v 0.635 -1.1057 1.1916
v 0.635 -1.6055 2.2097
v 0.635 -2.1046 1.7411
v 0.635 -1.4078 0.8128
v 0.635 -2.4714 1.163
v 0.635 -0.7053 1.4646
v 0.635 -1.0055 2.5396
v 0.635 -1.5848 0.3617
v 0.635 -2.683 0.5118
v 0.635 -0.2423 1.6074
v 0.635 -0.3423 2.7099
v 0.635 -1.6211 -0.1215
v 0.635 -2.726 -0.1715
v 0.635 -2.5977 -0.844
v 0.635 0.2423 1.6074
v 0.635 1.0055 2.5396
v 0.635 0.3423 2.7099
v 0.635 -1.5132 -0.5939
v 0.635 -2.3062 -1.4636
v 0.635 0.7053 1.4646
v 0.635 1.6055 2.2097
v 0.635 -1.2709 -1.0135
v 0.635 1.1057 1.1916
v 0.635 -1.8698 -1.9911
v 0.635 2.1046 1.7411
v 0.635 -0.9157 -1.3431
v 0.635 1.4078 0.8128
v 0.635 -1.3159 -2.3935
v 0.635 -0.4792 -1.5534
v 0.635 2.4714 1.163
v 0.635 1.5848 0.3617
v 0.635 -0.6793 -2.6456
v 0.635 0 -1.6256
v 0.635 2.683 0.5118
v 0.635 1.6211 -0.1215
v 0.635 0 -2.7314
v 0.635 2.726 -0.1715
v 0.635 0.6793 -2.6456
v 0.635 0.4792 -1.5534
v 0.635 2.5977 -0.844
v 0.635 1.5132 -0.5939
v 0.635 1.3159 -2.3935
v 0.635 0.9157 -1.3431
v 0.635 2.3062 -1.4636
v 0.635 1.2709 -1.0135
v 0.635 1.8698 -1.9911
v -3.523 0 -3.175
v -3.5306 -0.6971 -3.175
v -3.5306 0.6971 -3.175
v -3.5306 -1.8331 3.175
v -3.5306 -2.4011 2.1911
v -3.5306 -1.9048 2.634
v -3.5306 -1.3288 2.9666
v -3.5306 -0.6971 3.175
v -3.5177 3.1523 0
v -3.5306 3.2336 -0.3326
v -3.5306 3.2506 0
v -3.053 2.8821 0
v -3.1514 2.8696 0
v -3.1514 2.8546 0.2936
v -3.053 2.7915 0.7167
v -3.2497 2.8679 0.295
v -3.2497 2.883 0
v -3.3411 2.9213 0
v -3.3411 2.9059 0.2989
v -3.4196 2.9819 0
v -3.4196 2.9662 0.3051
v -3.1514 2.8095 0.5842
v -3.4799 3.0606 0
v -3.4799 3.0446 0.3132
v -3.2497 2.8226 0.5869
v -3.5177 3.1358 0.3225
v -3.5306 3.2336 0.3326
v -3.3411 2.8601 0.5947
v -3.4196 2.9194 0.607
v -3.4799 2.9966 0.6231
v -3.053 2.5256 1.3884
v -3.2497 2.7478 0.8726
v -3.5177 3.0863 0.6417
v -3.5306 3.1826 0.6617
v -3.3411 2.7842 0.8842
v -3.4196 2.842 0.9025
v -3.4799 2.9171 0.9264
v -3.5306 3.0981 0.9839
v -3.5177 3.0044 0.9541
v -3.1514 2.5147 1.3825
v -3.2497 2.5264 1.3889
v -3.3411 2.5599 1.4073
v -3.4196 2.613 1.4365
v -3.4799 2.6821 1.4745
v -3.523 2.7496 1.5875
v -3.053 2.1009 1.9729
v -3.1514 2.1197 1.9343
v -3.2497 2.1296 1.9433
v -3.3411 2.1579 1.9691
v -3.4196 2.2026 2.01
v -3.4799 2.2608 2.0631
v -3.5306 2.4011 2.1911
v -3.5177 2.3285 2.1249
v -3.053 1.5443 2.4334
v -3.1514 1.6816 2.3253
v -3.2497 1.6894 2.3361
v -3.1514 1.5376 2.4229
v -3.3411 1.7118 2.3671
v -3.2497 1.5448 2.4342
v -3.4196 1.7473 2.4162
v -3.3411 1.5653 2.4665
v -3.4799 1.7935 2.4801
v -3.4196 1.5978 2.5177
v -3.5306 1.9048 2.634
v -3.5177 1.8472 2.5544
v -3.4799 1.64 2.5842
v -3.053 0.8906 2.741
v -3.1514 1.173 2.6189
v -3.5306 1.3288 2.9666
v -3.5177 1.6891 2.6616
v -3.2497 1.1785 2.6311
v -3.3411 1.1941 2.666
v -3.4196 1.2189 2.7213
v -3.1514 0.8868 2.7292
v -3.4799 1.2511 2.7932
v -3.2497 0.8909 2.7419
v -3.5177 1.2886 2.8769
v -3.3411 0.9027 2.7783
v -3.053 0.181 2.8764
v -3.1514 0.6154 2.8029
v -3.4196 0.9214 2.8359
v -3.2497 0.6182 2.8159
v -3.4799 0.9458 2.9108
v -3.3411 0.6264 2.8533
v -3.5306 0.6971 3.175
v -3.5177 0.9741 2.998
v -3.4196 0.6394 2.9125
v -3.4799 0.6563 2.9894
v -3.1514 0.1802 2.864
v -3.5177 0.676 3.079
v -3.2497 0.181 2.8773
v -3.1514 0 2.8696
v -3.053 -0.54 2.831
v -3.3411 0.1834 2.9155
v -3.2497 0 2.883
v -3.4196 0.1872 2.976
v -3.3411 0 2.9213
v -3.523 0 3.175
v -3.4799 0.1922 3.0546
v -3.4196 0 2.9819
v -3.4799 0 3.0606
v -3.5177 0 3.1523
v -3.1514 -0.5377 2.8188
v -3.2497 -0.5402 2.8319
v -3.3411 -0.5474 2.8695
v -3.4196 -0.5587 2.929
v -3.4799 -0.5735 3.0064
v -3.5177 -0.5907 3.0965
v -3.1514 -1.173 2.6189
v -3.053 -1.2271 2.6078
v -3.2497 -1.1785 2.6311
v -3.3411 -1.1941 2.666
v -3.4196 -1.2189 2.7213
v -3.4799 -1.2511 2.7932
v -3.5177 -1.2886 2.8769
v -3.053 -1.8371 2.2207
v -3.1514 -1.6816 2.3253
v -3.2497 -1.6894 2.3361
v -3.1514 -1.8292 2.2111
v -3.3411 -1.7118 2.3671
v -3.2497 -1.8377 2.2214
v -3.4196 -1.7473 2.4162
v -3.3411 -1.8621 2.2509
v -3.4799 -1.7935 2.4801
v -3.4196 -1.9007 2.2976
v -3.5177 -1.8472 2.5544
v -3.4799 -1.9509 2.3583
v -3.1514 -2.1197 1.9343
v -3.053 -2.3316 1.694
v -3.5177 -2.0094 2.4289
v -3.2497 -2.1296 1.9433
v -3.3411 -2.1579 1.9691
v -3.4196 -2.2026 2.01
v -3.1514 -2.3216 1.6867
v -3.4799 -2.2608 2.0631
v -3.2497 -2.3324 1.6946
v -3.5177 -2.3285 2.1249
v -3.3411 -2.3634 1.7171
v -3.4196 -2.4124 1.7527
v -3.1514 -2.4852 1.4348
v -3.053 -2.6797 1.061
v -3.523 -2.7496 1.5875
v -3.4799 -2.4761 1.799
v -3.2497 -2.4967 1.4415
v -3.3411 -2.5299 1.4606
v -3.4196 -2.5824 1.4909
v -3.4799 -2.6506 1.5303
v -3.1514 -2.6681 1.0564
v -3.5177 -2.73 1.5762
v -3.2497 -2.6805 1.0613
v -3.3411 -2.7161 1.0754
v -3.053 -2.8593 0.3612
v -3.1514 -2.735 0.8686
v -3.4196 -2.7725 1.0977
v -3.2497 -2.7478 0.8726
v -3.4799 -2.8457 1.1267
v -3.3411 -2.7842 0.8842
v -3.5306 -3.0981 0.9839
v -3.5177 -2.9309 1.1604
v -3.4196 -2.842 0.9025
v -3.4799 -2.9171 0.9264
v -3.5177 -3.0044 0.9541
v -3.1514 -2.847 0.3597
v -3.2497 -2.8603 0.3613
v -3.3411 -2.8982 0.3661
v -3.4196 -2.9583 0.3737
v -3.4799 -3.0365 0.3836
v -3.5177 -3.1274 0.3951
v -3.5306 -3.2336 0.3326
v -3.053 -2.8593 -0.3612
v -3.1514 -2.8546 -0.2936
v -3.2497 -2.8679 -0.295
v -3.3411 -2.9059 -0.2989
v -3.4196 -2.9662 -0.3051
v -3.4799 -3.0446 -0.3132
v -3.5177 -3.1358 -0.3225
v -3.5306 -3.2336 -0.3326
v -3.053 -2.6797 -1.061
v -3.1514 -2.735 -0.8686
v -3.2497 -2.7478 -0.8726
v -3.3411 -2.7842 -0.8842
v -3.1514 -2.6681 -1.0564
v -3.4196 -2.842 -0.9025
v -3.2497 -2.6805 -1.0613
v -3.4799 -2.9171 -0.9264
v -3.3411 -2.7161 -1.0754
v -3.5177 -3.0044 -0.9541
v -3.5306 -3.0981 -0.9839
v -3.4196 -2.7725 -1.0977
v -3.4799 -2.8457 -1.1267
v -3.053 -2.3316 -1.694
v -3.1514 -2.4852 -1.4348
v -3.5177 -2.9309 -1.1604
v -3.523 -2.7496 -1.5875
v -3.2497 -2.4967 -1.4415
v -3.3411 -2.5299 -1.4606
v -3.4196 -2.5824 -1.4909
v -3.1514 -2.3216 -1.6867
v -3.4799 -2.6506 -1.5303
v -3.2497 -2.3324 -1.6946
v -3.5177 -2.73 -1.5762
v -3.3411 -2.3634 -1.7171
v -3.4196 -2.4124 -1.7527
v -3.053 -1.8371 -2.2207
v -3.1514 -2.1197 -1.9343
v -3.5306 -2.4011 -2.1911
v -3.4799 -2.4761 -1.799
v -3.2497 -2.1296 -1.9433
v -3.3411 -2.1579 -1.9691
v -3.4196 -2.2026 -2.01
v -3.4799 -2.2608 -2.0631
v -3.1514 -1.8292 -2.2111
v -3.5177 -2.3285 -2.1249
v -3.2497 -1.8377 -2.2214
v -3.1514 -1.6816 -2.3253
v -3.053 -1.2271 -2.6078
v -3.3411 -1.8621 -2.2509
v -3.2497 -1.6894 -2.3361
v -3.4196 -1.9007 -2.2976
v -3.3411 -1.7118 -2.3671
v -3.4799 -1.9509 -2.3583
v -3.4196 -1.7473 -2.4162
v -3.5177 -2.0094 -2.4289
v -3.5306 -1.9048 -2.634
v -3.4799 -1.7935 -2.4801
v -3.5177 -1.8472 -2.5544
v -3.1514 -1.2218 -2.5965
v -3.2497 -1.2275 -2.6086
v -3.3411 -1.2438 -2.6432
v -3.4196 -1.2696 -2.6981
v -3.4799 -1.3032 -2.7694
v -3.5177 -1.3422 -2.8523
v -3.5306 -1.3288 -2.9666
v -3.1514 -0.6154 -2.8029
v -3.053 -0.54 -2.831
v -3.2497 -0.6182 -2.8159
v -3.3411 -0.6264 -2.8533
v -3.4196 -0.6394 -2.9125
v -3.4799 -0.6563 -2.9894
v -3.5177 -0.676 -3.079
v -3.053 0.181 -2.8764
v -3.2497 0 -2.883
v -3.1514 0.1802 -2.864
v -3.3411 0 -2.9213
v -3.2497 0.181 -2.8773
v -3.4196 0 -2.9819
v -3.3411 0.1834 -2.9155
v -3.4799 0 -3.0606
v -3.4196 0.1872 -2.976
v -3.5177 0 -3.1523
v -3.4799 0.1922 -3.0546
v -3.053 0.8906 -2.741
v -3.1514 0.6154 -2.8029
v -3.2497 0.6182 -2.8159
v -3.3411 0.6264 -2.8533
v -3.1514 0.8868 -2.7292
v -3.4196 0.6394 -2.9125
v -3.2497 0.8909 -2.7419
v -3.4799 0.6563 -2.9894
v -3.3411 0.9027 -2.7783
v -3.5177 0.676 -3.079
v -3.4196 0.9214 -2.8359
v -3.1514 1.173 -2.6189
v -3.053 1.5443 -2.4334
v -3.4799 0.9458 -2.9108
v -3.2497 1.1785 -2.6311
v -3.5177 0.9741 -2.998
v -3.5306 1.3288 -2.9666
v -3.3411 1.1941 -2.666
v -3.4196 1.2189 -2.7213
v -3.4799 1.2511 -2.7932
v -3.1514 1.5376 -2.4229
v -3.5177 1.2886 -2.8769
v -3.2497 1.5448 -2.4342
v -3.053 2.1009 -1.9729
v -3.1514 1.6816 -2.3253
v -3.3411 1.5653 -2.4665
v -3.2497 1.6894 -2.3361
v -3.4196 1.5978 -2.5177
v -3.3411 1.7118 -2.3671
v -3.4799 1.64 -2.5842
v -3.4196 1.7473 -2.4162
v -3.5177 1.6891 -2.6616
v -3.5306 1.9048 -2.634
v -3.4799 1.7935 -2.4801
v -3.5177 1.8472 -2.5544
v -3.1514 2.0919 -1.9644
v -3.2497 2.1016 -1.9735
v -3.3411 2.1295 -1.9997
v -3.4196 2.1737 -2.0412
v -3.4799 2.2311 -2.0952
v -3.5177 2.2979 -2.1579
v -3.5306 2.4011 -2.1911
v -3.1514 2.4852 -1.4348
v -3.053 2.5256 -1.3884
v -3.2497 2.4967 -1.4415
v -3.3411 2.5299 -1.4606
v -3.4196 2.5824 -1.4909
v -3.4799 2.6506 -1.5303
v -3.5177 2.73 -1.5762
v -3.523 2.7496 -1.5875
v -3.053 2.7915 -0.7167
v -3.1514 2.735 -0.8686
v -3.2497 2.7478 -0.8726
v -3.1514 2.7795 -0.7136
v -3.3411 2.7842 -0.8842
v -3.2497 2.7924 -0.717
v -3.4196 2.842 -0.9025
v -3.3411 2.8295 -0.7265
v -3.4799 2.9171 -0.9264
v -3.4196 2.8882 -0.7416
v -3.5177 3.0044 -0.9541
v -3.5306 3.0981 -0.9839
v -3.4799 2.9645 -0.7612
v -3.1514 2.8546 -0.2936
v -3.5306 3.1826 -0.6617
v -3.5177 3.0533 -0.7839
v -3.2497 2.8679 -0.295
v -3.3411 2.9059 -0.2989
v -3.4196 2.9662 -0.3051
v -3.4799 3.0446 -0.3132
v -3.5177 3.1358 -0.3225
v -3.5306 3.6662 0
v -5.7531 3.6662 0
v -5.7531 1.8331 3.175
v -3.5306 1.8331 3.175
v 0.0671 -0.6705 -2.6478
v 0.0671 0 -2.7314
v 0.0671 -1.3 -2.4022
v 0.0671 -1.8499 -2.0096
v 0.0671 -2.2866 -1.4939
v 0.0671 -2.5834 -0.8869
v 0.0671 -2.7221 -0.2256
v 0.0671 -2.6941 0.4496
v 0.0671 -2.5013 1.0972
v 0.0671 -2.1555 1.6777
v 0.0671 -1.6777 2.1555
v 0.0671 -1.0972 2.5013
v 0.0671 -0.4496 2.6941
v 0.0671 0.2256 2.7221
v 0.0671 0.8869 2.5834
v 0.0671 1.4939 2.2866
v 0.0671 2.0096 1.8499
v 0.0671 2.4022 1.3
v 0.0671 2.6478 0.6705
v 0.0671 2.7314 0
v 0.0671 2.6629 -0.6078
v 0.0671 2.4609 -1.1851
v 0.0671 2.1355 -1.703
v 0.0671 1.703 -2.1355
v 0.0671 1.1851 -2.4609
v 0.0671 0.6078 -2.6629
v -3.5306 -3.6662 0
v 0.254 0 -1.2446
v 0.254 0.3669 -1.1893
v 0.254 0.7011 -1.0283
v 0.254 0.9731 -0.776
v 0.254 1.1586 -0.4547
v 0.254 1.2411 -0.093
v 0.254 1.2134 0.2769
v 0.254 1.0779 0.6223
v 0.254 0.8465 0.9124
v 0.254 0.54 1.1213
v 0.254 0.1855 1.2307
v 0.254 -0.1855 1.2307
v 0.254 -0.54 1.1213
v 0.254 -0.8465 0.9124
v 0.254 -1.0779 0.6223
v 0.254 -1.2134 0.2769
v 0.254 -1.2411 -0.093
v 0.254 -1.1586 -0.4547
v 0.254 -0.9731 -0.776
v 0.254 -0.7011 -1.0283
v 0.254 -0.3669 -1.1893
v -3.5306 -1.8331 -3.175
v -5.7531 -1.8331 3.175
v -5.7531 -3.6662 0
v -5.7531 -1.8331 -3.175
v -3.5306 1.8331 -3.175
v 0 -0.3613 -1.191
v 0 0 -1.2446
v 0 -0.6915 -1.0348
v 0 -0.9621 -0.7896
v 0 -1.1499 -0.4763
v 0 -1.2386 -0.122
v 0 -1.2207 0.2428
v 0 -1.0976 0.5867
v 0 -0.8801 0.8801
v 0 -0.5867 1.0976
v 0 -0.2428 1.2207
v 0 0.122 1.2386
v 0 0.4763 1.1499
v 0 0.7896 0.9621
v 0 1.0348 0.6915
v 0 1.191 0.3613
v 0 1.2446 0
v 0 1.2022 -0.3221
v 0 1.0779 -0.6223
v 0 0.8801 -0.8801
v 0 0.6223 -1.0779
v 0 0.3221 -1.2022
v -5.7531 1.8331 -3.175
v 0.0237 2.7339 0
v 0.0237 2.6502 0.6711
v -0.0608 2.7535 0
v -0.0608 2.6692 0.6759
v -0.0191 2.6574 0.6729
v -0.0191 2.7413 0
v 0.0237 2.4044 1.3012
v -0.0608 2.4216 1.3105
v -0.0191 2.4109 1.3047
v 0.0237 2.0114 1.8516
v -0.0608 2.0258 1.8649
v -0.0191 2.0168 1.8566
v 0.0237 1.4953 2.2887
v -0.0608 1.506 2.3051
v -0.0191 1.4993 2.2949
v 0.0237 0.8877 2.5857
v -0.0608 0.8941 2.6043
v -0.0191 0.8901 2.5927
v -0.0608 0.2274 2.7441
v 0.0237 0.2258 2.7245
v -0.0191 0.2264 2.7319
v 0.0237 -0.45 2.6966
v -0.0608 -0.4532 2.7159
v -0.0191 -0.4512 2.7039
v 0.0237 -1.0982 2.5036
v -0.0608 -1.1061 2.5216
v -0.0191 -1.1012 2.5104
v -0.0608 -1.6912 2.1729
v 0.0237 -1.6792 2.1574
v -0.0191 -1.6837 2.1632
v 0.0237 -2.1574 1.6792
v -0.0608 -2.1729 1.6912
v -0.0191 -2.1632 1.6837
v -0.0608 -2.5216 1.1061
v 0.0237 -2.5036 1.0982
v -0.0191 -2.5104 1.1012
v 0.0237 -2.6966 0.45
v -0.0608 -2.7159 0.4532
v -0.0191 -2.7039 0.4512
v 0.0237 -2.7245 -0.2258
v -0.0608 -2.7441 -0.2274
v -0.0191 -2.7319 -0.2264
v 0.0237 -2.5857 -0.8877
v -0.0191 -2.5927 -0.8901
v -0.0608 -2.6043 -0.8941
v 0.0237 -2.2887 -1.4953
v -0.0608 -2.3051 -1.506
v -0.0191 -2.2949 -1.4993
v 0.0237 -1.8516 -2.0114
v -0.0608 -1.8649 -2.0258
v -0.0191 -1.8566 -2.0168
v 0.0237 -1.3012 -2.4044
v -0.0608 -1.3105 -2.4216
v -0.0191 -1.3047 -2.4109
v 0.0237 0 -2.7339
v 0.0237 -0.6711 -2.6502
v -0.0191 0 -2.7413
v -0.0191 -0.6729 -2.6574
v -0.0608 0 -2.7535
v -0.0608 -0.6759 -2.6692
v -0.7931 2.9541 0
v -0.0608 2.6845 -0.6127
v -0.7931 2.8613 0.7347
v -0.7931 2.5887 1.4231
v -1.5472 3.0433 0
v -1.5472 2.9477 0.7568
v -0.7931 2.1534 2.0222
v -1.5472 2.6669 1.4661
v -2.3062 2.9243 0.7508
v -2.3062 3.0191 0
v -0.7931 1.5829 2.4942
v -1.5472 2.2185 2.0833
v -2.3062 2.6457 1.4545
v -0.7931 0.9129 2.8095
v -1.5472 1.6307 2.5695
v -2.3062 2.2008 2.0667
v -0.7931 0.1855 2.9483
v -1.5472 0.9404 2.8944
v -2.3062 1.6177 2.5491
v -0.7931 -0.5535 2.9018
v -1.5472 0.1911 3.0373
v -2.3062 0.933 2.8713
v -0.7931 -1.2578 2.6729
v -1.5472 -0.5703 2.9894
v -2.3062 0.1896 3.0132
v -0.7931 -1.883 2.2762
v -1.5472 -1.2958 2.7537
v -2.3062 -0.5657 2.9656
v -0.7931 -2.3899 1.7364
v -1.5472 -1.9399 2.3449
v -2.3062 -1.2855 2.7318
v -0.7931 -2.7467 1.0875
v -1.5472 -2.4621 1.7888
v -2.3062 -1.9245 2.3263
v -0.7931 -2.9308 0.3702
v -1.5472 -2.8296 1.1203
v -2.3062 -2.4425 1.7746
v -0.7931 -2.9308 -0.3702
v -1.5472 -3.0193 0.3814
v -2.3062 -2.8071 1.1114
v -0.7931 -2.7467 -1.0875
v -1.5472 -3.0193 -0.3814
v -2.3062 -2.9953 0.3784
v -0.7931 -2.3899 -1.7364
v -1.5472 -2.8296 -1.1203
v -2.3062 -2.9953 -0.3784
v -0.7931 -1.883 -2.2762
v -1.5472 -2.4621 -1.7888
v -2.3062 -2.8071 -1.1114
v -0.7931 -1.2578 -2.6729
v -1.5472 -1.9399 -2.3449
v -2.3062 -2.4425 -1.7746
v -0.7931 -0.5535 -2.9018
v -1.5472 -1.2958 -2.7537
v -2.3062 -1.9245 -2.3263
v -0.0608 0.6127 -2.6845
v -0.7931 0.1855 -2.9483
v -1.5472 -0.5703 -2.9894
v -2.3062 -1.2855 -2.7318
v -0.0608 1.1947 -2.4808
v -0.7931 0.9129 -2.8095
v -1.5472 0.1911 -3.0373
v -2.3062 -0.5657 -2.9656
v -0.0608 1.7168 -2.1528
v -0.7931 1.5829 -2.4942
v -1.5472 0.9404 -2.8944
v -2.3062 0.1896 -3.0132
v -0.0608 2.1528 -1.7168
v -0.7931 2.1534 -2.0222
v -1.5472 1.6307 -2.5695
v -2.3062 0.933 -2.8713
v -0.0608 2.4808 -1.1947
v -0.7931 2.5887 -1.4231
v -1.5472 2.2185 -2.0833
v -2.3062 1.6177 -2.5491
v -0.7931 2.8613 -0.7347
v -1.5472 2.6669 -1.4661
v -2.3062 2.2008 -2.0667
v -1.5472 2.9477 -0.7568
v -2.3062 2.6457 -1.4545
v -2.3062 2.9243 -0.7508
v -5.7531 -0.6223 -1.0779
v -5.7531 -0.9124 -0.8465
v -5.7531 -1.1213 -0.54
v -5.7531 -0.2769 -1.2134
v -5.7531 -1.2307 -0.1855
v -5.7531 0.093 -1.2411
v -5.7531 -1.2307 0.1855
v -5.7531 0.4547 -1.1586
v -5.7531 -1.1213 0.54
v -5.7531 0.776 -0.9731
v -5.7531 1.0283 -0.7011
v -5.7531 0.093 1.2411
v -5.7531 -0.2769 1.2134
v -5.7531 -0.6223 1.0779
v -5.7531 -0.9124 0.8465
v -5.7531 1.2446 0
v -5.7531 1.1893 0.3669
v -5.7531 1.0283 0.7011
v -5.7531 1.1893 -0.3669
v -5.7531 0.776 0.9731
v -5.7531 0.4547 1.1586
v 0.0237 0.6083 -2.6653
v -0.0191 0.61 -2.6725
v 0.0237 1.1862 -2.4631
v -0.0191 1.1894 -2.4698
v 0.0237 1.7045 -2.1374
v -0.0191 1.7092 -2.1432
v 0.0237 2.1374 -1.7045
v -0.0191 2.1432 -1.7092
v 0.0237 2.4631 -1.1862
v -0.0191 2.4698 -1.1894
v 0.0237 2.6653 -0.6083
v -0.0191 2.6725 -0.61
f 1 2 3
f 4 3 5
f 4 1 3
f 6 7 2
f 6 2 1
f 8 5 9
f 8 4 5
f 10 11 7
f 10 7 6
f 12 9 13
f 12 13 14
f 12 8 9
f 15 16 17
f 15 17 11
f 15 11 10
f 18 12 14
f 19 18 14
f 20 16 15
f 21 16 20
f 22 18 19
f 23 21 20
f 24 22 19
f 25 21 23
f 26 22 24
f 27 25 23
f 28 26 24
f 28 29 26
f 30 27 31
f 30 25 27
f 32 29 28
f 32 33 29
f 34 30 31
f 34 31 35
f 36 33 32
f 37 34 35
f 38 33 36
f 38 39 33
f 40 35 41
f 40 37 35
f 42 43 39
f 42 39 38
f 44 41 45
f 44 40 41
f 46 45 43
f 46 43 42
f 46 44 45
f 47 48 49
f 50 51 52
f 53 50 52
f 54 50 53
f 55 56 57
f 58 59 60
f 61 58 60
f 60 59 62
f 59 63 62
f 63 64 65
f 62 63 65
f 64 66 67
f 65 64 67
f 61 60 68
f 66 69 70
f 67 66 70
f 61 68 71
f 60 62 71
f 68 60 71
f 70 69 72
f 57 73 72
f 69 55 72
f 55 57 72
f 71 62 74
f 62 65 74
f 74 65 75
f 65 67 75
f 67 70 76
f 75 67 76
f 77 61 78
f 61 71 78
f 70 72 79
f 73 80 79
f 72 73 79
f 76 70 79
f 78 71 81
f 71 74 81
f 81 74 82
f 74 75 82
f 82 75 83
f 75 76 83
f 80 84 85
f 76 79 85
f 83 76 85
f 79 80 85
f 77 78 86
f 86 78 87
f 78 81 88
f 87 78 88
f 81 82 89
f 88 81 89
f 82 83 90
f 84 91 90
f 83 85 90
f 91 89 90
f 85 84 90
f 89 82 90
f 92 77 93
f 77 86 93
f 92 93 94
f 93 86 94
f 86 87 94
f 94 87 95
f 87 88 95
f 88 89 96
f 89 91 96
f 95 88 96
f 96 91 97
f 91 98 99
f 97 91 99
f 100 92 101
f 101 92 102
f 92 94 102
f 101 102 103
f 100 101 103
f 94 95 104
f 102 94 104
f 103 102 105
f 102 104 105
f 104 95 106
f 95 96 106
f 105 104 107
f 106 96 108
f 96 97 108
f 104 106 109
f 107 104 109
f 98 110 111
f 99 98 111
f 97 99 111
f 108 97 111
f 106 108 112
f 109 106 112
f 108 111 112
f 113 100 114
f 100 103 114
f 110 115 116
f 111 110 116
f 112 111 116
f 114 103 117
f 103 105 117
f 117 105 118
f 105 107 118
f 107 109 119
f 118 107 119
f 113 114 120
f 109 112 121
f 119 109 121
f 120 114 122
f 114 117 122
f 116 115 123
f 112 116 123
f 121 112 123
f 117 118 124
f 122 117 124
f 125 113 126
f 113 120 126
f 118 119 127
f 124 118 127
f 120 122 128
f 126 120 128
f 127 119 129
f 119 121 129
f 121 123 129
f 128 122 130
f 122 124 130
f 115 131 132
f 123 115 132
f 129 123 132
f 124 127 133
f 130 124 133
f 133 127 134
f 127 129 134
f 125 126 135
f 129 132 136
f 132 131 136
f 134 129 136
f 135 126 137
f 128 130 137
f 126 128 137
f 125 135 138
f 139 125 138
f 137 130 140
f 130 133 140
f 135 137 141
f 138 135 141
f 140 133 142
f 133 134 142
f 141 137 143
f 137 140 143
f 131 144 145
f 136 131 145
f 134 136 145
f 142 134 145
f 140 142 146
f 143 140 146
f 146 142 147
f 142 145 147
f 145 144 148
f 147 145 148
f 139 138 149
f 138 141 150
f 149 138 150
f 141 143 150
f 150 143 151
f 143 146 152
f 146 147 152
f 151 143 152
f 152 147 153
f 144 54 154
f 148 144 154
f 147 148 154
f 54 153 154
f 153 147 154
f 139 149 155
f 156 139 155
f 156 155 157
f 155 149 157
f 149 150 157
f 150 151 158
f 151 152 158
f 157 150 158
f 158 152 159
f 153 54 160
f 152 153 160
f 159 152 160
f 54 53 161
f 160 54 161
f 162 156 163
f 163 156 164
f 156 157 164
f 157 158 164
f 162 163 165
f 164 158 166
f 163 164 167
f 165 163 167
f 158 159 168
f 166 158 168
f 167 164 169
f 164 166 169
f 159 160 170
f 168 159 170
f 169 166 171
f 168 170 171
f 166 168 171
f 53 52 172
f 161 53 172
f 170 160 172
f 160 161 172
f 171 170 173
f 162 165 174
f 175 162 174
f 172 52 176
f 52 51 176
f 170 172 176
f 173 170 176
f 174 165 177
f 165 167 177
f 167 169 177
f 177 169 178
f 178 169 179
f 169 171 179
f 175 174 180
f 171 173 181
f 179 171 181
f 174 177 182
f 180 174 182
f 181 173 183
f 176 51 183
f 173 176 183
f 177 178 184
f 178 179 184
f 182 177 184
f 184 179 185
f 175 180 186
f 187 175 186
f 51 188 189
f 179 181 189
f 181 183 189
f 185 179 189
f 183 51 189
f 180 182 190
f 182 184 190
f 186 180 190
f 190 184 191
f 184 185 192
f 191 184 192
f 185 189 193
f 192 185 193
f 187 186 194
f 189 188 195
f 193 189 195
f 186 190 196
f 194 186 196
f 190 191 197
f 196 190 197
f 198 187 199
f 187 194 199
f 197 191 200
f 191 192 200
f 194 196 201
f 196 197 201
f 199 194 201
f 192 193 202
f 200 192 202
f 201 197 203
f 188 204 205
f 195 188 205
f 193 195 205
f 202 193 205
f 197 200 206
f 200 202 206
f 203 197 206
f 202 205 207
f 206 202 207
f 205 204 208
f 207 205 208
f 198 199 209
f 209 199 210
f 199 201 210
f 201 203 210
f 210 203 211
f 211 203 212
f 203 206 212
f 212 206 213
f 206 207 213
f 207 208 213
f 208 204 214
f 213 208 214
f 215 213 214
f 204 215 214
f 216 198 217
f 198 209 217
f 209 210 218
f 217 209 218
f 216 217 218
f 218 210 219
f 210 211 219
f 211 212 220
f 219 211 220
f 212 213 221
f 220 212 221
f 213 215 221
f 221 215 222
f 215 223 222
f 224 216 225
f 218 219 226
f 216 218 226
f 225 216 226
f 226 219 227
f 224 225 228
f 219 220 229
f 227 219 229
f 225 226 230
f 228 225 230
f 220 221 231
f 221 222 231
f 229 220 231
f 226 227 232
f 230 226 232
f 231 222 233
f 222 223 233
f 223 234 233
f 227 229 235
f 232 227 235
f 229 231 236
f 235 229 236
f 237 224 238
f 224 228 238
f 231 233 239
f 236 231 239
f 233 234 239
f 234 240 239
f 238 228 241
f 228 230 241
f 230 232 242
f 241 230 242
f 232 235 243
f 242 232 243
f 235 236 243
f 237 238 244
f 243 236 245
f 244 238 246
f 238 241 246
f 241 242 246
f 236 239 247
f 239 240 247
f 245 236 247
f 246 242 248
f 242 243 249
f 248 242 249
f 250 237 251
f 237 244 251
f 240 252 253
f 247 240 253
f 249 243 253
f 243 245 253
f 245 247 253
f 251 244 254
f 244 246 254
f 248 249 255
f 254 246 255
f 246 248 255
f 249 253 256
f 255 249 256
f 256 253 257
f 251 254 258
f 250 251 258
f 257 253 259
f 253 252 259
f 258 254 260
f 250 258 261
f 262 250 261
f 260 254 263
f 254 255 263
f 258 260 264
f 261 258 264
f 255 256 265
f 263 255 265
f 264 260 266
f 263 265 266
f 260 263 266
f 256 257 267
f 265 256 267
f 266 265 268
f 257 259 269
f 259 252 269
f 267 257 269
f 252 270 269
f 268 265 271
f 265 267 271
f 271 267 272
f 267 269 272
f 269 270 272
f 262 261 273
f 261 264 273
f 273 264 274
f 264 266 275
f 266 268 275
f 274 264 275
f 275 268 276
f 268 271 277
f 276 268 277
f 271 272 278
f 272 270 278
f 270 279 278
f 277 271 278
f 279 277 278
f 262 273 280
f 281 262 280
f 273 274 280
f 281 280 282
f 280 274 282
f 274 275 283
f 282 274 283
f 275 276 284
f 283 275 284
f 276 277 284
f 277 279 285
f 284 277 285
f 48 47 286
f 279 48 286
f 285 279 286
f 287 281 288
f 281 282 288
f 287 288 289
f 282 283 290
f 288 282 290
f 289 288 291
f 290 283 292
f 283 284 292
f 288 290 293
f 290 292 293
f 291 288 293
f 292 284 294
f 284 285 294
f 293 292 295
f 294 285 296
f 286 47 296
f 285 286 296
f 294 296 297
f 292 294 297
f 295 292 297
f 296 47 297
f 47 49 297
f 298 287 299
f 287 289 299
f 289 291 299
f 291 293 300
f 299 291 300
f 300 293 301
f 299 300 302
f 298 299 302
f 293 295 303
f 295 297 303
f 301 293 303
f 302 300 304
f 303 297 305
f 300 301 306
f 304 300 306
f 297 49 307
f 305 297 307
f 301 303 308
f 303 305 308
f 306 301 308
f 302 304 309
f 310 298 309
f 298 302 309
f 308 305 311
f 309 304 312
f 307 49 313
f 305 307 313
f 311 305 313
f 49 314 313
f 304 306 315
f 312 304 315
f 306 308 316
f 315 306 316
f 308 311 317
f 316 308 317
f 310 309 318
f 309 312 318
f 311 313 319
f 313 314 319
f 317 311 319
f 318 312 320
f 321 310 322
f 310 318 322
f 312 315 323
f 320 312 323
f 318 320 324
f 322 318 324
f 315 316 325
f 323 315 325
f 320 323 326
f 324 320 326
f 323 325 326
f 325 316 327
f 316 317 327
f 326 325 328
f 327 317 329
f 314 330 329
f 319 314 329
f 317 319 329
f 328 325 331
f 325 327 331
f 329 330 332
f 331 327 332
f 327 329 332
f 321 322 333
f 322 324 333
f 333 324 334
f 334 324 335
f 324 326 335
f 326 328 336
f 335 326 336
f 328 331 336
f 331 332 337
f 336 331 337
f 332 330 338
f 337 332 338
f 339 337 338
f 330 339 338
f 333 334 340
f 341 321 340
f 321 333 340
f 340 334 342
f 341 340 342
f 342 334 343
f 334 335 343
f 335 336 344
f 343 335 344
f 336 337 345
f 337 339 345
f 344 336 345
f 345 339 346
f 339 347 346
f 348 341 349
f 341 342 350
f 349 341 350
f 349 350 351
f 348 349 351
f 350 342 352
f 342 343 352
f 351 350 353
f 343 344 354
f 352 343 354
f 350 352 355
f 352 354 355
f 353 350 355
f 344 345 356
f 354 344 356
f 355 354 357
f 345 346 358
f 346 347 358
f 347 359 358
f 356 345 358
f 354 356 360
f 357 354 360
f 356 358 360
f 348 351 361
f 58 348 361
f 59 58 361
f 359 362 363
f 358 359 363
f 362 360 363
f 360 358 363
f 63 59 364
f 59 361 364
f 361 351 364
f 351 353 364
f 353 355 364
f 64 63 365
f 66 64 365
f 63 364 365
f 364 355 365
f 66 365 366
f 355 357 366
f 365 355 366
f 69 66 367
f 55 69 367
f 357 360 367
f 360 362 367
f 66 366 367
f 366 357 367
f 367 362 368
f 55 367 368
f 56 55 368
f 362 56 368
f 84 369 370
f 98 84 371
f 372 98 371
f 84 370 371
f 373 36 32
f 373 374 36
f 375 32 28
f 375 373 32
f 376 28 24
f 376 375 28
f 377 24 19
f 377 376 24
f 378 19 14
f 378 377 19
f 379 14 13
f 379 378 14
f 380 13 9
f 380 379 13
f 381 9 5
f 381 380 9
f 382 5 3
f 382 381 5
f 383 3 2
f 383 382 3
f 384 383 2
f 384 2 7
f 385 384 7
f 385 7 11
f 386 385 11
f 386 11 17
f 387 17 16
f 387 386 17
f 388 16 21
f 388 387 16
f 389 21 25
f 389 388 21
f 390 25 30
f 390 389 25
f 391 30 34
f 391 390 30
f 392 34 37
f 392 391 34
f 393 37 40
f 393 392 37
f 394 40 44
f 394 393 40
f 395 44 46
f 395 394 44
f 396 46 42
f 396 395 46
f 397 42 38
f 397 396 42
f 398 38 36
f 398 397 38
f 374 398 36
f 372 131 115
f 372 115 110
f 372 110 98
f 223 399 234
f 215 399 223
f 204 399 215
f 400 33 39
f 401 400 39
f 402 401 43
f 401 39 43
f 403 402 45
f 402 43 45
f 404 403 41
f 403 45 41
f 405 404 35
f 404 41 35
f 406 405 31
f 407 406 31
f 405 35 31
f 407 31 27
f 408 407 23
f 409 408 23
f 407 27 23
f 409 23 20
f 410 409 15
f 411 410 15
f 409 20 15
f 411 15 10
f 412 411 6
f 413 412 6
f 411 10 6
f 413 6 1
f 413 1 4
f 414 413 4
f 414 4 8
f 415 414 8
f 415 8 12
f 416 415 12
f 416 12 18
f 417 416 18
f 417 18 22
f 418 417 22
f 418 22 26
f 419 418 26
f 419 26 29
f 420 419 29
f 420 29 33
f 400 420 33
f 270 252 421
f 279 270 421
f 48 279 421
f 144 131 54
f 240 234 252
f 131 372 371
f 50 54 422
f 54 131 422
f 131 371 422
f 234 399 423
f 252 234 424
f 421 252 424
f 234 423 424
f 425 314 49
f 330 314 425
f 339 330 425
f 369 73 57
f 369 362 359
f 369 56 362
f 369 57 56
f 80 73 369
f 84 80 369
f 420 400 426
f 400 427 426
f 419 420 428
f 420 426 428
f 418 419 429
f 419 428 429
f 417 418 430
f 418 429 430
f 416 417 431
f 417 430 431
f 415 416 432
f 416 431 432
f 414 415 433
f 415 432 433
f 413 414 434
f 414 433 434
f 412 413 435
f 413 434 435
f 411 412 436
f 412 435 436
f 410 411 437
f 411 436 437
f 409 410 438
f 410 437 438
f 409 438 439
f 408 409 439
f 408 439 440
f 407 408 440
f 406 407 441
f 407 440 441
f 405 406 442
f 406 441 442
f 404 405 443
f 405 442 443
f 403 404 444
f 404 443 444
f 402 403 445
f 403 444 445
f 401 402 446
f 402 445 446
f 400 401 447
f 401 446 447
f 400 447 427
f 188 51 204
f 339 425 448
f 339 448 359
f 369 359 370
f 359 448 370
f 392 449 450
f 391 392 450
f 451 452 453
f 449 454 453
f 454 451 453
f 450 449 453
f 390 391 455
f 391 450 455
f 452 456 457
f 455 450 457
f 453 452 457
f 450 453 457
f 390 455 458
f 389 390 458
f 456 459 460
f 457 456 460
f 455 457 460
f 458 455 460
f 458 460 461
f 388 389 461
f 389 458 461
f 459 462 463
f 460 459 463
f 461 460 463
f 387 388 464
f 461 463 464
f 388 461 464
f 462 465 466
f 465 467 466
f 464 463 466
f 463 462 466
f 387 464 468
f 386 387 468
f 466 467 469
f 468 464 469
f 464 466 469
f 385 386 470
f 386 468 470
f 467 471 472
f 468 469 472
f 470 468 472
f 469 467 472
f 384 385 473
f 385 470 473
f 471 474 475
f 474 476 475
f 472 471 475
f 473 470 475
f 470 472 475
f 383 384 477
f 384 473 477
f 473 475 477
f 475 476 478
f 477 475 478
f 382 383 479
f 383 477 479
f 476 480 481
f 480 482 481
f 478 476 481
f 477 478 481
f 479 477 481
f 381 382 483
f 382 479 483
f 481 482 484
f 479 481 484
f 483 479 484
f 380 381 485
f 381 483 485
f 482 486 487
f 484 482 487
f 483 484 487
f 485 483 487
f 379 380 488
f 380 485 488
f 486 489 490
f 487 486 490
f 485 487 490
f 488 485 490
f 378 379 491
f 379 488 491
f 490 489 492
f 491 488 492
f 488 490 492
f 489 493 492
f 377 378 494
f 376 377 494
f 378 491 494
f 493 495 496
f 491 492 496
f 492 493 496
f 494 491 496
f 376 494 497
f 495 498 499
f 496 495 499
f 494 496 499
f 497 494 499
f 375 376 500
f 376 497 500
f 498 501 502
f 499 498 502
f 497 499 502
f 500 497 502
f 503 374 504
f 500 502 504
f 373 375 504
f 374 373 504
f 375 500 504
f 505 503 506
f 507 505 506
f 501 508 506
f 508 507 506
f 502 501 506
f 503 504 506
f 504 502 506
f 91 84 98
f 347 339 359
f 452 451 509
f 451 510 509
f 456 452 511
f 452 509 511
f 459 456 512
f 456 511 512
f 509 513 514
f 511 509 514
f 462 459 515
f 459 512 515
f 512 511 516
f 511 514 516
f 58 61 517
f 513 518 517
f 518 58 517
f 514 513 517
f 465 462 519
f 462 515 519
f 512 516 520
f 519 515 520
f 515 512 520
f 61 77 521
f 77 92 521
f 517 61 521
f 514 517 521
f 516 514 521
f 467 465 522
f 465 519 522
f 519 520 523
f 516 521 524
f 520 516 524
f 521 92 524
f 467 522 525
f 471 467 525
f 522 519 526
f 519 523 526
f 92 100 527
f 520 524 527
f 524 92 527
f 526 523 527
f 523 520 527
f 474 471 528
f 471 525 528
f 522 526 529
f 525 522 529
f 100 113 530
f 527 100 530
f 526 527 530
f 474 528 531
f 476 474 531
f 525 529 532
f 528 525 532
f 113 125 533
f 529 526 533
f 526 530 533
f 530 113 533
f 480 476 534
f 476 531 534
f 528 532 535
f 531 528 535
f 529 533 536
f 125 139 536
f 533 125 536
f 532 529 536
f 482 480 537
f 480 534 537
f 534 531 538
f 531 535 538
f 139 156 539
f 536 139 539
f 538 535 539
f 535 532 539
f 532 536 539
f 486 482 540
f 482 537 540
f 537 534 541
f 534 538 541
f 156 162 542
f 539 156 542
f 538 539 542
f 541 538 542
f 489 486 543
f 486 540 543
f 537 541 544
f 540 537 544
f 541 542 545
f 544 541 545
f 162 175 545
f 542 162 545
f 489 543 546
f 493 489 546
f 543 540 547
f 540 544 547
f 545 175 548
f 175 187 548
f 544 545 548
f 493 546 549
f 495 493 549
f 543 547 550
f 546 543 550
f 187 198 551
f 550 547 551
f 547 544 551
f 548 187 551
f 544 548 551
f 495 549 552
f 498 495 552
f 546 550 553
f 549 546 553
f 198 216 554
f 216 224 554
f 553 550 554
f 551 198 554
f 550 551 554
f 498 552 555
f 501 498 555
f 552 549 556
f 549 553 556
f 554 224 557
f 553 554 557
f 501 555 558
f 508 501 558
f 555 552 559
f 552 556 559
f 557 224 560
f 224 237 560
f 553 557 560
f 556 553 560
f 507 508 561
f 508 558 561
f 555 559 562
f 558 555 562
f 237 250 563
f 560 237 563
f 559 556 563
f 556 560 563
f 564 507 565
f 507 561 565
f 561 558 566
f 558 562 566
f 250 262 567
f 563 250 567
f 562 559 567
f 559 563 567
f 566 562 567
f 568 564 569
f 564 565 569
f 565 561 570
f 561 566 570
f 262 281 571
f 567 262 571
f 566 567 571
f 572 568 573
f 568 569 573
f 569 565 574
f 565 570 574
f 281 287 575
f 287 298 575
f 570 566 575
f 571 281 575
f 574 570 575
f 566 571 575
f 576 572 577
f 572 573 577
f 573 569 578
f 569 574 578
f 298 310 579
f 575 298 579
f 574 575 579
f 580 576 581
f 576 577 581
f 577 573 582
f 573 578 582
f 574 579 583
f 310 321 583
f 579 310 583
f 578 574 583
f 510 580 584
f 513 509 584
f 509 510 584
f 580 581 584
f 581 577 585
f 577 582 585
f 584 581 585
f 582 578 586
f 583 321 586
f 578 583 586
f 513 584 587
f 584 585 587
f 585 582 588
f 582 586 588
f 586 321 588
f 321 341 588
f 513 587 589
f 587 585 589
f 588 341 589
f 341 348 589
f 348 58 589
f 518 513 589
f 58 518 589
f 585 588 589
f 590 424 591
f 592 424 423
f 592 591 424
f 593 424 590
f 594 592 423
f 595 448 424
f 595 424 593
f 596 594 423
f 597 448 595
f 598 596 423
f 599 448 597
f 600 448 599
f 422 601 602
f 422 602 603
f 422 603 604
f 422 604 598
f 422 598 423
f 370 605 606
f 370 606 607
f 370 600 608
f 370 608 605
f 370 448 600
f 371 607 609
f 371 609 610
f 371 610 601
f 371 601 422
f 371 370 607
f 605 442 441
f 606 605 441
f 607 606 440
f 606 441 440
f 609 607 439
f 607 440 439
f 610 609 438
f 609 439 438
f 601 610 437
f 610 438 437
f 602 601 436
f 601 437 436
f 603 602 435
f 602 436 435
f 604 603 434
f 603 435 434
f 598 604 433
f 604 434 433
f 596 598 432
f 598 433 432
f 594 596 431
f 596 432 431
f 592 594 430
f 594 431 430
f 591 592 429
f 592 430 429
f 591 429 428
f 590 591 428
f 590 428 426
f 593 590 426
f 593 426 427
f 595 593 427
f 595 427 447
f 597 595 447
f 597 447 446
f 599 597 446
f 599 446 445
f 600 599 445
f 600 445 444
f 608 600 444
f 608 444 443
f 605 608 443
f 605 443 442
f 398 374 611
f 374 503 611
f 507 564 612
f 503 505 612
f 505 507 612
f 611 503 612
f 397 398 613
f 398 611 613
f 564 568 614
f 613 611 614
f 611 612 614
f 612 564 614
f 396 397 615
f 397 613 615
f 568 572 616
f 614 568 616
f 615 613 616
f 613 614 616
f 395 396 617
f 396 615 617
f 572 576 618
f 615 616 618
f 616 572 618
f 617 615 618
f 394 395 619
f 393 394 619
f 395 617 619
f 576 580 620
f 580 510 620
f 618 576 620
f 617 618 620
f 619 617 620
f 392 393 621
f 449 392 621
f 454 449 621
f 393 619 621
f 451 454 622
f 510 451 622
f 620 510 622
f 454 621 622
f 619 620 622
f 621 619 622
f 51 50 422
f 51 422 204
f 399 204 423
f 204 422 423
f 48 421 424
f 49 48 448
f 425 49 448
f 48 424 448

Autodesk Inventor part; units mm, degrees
ref_plane "YZ Plane" through (0, 0, 0) normal (1, 0, 0) x (0, 1, 0)
ref_plane "XZ Plane" through (0, 0, 0) normal (0, 1, 0) x (-1, 0, 0)
ref_plane "XY Plane" through (0, 0, 0) normal (0, 0, 1) x (1, 0, 0)
sketch "Sketch1" plane through (0, 0, 0) normal (0, 0, 1) x (1, 0, 0)
  line L0 (-6.9037, 0) -> (1.1506, 0) projected
  line L1 (0, -3.0734) -> (0, 4.2164) construction
  line L2 (-3.5306, 3.175) -> (-5.7531, 3.175)
  line L3 (-5.7531, 3.175) -> (-5.7531, 1.2446)
  line L4 (-5.7531, 1.2446) -> (0, 1.2446)
  line L5 (0, 1.2446) -> (0, 2.7314)
  line L6 (-3.5306, 3.175) -> (-3.5306, 2.7314)
  arc A0 (0, 2.7314) -> (-3.5306, 2.7314) centre (-1.7653, -2.032) ccw
  point P0 (0, 0)
  dimension "d0" = 6.35
  dimension "d1" = 5.08
  dimension "d2" = 3.9878
  dimension "d3" = 2.2225
  dimension "d5" = 2.4892
  dimension "d6" = 5.4628
revolve "Revolution1" add sketch "Sketch1" angle 360 about axis through (-10, 0, 0) along (1, 0, 0)
sketch "Sketch2" plane through (-5.7531, 0, 0) normal (-1, 0, 0) x (0, 0, 1)
  circle A0 centre (0, 0) radius 3.175 projected
  line L0 (3.175, -1.8331) -> (0, -3.6662)
  line L1 (0, -3.6662) -> (-3.175, -1.8331)
  line L2 (-3.175, -1.8331) -> (-3.175, 1.8331)
  line L3 (-3.175, 1.8331) -> (0, 3.6662)
  line L4 (0, 3.6662) -> (3.175, 1.8331)
  line L5 (3.175, 1.8331) -> (3.175, -1.8331)
  point P0 (3.175, 0)
extrude "Extrusion1" add sketch "Sketch2" against normal up to surface (2.2225 mm away) contours L5 L0 A0 | A0 L4 L5 | A0 L3 L4 | L0 L1 A0 | A0 L2 L3 | L1 L2 A0
sketch "Sketch3" plane through (0, 0, 0) normal (1, 0, 0) x (0, 0, -1)
  circle A0 centre (0, 0) radius 2.7314 projected
  circle A1 centre (0, 0) radius 1.2446 projected
extrude "Extrusion2" add sketch "Sketch3" along normal blind 0.635
fillet "Fillet1" radius 0.381 3 edges at (-3.5306, -2.7314, 0) (0, 1.9314, -1.9314) (0, -1.9314, 1.9314)
chamfer "Chamfer1" distance 0.381 angle 45 1 edges at (0.635, 0, 1.2446)
properties part number "Shock Bushing"
